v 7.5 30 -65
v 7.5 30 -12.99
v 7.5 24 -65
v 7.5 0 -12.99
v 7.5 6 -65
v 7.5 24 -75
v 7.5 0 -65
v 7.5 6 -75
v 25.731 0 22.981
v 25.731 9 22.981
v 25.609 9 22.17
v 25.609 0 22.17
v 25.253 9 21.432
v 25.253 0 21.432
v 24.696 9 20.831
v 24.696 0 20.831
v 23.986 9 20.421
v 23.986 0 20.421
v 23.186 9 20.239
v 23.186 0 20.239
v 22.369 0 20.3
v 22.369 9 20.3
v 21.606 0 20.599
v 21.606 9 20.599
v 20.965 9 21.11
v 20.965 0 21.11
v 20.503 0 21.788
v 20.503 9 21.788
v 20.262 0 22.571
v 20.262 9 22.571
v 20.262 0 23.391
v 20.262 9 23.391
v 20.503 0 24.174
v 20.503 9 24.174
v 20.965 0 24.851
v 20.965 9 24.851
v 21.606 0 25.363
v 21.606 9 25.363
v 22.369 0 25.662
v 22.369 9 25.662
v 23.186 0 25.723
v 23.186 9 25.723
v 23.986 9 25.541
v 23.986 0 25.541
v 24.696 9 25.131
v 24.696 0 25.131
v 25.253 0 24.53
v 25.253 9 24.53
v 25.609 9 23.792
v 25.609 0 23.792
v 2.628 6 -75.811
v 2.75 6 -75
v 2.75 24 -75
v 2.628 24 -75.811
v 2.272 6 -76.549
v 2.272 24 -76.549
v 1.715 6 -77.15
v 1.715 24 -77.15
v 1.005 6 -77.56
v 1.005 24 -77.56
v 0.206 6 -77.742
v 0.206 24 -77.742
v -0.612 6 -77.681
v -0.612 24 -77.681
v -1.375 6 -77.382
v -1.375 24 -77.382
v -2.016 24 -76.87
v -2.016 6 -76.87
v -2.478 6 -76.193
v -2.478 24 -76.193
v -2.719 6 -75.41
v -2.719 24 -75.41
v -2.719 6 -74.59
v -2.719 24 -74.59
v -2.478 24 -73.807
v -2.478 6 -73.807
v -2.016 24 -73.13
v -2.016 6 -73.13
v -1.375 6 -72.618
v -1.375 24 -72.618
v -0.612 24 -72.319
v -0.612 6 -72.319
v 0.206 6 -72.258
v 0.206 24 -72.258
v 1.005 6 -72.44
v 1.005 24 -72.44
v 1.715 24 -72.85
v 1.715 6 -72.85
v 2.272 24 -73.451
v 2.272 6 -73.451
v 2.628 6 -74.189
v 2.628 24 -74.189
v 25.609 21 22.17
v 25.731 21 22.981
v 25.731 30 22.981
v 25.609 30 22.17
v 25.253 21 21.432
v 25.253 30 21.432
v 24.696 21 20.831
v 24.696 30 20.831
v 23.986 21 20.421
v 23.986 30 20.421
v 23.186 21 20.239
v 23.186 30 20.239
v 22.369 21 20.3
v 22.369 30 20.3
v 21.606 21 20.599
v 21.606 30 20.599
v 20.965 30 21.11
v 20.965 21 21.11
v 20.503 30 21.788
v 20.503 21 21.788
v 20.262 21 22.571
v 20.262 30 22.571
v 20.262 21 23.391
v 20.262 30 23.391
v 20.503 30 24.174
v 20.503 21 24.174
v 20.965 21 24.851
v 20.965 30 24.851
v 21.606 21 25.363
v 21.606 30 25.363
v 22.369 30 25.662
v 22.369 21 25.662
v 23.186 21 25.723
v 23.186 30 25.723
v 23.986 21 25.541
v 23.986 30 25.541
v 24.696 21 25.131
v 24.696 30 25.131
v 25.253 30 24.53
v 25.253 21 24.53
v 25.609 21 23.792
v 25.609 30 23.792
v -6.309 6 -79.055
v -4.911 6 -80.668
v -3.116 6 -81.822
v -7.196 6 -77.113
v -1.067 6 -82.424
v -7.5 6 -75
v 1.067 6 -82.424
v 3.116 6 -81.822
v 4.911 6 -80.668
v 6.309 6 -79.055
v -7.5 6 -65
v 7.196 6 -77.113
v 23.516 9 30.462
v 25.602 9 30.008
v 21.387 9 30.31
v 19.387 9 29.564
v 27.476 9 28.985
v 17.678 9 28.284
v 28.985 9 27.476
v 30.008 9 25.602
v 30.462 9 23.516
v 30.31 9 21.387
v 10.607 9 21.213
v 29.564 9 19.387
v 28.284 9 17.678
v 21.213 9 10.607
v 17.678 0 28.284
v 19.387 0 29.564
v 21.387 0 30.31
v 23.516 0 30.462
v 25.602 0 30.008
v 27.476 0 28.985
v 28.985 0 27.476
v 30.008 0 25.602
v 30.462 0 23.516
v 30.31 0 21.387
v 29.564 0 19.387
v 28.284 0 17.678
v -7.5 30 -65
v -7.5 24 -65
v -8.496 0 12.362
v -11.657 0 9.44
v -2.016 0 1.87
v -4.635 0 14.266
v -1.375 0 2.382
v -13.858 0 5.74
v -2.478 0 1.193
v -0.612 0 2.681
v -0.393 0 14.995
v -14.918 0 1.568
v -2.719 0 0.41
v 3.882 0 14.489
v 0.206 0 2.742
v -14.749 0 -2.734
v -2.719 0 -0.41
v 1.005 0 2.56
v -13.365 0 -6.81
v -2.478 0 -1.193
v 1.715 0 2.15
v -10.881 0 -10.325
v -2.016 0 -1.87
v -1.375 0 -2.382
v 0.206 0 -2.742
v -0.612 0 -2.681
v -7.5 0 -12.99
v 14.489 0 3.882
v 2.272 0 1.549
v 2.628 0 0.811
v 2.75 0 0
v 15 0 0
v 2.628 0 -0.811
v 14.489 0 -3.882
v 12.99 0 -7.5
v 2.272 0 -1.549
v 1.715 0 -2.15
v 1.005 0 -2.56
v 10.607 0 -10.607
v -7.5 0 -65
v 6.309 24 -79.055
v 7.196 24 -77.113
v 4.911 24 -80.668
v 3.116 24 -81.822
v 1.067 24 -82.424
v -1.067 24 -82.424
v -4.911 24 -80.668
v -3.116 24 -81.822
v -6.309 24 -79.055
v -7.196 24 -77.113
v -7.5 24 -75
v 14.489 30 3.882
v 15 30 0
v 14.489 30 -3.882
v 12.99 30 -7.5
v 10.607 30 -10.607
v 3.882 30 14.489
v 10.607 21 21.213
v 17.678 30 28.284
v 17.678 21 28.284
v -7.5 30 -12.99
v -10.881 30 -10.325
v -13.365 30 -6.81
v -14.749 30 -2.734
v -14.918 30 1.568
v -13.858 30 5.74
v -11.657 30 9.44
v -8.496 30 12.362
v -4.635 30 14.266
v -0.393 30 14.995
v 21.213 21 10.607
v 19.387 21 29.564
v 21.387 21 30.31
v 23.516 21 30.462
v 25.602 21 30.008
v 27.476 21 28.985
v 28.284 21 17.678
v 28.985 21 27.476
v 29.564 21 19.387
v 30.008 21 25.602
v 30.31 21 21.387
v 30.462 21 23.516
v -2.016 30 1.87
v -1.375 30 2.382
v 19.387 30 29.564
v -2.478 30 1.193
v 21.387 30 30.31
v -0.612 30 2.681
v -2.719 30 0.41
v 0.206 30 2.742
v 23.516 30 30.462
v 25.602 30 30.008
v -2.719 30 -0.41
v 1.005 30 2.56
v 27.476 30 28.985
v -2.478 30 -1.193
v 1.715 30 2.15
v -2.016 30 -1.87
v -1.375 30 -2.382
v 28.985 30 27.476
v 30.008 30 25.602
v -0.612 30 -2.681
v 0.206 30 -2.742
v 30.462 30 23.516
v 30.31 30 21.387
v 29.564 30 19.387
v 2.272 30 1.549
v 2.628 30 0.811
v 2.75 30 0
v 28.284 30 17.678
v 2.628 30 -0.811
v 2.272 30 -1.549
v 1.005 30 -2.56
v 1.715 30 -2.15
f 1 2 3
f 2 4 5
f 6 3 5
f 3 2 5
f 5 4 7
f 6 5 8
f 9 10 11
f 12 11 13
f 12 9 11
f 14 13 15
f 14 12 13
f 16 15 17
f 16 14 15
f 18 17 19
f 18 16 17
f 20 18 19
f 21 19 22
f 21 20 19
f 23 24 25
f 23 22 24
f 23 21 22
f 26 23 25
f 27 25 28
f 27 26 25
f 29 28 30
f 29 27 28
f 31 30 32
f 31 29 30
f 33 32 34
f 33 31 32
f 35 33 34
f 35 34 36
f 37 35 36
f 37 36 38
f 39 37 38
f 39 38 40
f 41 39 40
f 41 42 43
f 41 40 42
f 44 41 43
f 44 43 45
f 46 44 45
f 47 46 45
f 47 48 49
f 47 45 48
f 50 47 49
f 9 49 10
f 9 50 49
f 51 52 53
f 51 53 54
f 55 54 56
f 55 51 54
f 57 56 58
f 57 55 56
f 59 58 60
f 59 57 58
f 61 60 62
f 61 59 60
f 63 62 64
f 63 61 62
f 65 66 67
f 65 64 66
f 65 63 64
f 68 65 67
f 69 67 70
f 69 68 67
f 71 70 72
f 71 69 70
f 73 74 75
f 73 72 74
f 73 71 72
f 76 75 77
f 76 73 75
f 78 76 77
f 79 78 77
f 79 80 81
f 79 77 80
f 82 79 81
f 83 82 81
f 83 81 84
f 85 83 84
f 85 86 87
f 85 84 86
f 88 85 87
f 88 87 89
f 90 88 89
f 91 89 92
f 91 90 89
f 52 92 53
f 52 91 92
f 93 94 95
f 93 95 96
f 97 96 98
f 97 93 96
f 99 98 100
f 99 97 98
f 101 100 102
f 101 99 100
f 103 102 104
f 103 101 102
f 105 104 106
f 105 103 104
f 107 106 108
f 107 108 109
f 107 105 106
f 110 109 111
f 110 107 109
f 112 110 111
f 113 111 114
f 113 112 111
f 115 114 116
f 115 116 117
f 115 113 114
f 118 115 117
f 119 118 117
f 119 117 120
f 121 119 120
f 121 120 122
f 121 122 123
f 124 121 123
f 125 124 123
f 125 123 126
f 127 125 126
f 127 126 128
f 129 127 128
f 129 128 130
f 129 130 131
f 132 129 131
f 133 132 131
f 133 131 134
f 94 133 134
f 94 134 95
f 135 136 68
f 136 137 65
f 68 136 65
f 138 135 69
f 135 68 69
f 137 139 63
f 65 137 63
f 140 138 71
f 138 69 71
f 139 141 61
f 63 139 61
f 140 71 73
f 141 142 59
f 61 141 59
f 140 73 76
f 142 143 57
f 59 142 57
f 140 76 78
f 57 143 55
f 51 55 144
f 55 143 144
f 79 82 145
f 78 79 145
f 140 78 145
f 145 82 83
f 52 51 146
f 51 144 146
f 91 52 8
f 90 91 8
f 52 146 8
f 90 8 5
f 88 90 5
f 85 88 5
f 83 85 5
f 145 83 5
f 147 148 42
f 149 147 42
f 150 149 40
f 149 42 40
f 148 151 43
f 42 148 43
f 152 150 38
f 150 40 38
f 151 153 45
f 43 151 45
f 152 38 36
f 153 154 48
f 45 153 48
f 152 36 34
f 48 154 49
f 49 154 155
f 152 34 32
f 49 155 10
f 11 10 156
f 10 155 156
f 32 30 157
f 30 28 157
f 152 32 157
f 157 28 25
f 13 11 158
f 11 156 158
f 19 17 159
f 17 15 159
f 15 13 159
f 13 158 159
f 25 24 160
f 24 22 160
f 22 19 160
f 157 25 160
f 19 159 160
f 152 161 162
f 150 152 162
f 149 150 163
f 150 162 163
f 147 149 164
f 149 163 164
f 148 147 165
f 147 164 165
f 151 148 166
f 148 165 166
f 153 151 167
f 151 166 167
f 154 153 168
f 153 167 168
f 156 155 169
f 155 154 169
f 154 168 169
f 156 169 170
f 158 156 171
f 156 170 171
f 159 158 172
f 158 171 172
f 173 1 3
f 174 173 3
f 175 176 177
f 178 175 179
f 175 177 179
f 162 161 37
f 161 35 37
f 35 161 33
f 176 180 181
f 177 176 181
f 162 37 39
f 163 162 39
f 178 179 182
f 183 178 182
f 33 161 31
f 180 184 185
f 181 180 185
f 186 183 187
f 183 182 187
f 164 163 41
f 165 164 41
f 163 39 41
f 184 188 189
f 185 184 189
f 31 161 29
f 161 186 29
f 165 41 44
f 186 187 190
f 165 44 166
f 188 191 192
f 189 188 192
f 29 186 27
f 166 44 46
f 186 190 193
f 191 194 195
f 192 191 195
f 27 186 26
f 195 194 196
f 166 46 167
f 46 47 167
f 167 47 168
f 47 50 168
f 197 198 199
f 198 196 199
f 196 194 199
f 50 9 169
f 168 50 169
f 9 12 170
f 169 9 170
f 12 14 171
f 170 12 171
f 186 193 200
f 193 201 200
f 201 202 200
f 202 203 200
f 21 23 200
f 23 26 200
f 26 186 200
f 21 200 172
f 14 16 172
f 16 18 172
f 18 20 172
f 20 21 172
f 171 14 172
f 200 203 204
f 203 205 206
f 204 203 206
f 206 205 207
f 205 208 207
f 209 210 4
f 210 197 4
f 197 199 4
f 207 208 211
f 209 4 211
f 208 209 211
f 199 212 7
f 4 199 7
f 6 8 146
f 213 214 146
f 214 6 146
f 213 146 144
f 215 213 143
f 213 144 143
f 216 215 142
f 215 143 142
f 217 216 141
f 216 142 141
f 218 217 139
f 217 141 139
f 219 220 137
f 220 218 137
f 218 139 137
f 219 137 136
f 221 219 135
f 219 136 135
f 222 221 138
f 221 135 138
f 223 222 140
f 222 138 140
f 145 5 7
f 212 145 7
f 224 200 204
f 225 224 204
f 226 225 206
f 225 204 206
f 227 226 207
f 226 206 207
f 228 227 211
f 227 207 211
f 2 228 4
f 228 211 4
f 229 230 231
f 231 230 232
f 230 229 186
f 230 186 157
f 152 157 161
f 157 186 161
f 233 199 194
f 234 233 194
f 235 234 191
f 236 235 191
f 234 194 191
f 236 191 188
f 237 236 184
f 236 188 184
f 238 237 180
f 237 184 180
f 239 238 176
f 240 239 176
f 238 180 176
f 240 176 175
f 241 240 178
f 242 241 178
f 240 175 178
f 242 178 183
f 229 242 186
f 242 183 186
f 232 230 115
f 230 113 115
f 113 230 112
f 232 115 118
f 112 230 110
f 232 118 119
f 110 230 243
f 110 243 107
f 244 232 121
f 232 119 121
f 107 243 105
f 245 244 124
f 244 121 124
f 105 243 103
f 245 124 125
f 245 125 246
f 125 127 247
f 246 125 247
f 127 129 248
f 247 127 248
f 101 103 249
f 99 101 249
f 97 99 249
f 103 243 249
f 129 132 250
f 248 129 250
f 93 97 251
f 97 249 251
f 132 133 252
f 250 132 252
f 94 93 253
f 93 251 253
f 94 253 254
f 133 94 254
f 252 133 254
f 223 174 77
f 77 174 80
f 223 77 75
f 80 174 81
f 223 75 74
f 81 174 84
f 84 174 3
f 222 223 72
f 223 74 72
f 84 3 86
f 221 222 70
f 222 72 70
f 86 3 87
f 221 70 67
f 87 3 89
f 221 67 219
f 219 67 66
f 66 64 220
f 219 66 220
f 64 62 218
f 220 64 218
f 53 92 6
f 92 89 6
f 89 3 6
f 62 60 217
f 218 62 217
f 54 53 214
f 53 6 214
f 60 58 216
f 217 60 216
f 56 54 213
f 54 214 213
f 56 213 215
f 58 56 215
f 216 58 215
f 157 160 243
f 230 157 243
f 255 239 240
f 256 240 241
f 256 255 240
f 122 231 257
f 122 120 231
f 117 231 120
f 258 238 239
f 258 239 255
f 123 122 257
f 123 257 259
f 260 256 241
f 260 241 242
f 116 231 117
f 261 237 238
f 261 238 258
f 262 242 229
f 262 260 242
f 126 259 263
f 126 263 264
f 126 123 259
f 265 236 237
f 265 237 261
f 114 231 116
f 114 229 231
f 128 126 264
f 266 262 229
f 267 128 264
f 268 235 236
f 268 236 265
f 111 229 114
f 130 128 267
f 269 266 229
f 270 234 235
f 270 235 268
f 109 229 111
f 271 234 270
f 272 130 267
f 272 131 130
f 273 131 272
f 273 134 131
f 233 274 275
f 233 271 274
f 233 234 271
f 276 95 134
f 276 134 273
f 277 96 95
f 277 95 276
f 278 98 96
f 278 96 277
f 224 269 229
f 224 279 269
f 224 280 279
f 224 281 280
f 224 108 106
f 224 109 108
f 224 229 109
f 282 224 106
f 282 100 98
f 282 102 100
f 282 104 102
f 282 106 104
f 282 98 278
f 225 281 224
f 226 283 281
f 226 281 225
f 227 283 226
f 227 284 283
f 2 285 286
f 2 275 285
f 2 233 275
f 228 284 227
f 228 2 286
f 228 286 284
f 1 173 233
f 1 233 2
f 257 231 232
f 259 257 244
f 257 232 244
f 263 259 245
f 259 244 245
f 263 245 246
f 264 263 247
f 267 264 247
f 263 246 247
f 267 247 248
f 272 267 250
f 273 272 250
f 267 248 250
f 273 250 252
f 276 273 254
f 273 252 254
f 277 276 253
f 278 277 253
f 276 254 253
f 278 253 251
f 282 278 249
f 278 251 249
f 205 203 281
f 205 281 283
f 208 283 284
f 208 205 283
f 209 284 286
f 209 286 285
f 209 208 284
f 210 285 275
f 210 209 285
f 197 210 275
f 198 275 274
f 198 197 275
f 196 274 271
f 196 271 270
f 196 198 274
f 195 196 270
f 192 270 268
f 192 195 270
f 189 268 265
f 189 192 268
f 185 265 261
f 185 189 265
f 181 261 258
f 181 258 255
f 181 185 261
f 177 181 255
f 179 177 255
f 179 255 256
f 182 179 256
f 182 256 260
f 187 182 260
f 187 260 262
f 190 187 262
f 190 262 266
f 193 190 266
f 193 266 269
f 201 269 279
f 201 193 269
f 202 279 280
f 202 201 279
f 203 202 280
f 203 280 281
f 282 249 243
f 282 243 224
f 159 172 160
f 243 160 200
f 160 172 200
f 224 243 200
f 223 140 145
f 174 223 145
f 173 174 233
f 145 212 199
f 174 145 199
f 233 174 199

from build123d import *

# Parameters (mm, degrees)
SKETCH1_R           = 2.75
BOSS_EXTRUDE1_DEPTH = 30
SKETCH2_W           = 10
SKETCH2_H           = 6
CUT_EXTRUDE1_DEPTH  = 55
CUT_EXTRUDE2_DEPTH  = 17


with BuildPart() as part:
    # Sketch1 → Boss-Extrude1 (new body)
    with BuildSketch(Plane(origin=(0, 0, 0), x_dir=(1, 0, 0), z_dir=(0, 1, 0))):
        with BuildLine():
            Line((7.5, 12.990381057), (7.5, 75))
            ThreePointArc((7.5, 75), (0, 82.5), (-7.5, 75))
            Line((-7.5, 75), (-7.5, 12.990381057))
            ThreePointArc((-7.5, 12.990381057), (-13.858192988, -5.740251485), (3.882285677, -14.488887394))
            Line((3.882285677, -14.488887394), (17.67766953, -28.284271247))
            ThreePointArc((17.67766953, -28.284271247), (28.284271247, -28.284271247), (28.284271247, -17.67766953))
            Line((28.284271247, -17.67766953), (14.488887394, -3.882285677))
            ThreePointArc((14.488887394, -3.882285677), (13.858192988, 5.740251485), (7.5, 12.990381057))
        make_face()
        Circle(SKETCH1_R, mode=Mode.SUBTRACT)
        with Locations((22.980970389, -22.980970389)):
            Circle(SKETCH1_R, mode=Mode.SUBTRACT)
        with Locations((0, 75)):
            Circle(SKETCH1_R, mode=Mode.SUBTRACT)
    extrude(amount=BOSS_EXTRUDE1_DEPTH)

    # Sketch2 → Cut-Extrude1 (cut)
    with BuildSketch(Plane(origin=(7.5, 0, 0), x_dir=(0, 0, -1), z_dir=(1, 0, 0))):
        Polygon((75, 30), (75, 24), (88.340353556, 24), (88.340353556, 42.222756781), (65, 42.222756781), (65, 30), align=None)
        Polygon((88.340353556, 6), (75, 6), (75, 0), (65, 0), (65, -8.682673162), (88.340353556, -8.682673162), align=None)
        with Locations((70, 3)):
            Rectangle(SKETCH2_W, SKETCH2_H)
        with Locations((70, 27)):
            Rectangle(SKETCH2_W, SKETCH2_H)
    extrude(amount=-CUT_EXTRUDE1_DEPTH, mode=Mode.SUBTRACT)

    # Sketch3 → Cut-Extrude2 (cut)
    with BuildSketch(Plane(origin=(5.303300859, 0, -5.303300859), x_dir=(-0.707106781, 0, -0.707106781), z_dir=(0.707106781, 0, -0.707106781))):
        Polygon((-32.5, 21), (-32.5, 15), (-32.5, 9), (-22.5, 9), (-22.5, 21), align=None)
        Polygon((-32.5, 9), (-32.5, 15), (-32.5, 21), (-50.580242044, 21), (-50.580242044, 9), align=None)
    extrude(amount=-CUT_EXTRUDE2_DEPTH, mode=Mode.SUBTRACT)


solid = part.part
